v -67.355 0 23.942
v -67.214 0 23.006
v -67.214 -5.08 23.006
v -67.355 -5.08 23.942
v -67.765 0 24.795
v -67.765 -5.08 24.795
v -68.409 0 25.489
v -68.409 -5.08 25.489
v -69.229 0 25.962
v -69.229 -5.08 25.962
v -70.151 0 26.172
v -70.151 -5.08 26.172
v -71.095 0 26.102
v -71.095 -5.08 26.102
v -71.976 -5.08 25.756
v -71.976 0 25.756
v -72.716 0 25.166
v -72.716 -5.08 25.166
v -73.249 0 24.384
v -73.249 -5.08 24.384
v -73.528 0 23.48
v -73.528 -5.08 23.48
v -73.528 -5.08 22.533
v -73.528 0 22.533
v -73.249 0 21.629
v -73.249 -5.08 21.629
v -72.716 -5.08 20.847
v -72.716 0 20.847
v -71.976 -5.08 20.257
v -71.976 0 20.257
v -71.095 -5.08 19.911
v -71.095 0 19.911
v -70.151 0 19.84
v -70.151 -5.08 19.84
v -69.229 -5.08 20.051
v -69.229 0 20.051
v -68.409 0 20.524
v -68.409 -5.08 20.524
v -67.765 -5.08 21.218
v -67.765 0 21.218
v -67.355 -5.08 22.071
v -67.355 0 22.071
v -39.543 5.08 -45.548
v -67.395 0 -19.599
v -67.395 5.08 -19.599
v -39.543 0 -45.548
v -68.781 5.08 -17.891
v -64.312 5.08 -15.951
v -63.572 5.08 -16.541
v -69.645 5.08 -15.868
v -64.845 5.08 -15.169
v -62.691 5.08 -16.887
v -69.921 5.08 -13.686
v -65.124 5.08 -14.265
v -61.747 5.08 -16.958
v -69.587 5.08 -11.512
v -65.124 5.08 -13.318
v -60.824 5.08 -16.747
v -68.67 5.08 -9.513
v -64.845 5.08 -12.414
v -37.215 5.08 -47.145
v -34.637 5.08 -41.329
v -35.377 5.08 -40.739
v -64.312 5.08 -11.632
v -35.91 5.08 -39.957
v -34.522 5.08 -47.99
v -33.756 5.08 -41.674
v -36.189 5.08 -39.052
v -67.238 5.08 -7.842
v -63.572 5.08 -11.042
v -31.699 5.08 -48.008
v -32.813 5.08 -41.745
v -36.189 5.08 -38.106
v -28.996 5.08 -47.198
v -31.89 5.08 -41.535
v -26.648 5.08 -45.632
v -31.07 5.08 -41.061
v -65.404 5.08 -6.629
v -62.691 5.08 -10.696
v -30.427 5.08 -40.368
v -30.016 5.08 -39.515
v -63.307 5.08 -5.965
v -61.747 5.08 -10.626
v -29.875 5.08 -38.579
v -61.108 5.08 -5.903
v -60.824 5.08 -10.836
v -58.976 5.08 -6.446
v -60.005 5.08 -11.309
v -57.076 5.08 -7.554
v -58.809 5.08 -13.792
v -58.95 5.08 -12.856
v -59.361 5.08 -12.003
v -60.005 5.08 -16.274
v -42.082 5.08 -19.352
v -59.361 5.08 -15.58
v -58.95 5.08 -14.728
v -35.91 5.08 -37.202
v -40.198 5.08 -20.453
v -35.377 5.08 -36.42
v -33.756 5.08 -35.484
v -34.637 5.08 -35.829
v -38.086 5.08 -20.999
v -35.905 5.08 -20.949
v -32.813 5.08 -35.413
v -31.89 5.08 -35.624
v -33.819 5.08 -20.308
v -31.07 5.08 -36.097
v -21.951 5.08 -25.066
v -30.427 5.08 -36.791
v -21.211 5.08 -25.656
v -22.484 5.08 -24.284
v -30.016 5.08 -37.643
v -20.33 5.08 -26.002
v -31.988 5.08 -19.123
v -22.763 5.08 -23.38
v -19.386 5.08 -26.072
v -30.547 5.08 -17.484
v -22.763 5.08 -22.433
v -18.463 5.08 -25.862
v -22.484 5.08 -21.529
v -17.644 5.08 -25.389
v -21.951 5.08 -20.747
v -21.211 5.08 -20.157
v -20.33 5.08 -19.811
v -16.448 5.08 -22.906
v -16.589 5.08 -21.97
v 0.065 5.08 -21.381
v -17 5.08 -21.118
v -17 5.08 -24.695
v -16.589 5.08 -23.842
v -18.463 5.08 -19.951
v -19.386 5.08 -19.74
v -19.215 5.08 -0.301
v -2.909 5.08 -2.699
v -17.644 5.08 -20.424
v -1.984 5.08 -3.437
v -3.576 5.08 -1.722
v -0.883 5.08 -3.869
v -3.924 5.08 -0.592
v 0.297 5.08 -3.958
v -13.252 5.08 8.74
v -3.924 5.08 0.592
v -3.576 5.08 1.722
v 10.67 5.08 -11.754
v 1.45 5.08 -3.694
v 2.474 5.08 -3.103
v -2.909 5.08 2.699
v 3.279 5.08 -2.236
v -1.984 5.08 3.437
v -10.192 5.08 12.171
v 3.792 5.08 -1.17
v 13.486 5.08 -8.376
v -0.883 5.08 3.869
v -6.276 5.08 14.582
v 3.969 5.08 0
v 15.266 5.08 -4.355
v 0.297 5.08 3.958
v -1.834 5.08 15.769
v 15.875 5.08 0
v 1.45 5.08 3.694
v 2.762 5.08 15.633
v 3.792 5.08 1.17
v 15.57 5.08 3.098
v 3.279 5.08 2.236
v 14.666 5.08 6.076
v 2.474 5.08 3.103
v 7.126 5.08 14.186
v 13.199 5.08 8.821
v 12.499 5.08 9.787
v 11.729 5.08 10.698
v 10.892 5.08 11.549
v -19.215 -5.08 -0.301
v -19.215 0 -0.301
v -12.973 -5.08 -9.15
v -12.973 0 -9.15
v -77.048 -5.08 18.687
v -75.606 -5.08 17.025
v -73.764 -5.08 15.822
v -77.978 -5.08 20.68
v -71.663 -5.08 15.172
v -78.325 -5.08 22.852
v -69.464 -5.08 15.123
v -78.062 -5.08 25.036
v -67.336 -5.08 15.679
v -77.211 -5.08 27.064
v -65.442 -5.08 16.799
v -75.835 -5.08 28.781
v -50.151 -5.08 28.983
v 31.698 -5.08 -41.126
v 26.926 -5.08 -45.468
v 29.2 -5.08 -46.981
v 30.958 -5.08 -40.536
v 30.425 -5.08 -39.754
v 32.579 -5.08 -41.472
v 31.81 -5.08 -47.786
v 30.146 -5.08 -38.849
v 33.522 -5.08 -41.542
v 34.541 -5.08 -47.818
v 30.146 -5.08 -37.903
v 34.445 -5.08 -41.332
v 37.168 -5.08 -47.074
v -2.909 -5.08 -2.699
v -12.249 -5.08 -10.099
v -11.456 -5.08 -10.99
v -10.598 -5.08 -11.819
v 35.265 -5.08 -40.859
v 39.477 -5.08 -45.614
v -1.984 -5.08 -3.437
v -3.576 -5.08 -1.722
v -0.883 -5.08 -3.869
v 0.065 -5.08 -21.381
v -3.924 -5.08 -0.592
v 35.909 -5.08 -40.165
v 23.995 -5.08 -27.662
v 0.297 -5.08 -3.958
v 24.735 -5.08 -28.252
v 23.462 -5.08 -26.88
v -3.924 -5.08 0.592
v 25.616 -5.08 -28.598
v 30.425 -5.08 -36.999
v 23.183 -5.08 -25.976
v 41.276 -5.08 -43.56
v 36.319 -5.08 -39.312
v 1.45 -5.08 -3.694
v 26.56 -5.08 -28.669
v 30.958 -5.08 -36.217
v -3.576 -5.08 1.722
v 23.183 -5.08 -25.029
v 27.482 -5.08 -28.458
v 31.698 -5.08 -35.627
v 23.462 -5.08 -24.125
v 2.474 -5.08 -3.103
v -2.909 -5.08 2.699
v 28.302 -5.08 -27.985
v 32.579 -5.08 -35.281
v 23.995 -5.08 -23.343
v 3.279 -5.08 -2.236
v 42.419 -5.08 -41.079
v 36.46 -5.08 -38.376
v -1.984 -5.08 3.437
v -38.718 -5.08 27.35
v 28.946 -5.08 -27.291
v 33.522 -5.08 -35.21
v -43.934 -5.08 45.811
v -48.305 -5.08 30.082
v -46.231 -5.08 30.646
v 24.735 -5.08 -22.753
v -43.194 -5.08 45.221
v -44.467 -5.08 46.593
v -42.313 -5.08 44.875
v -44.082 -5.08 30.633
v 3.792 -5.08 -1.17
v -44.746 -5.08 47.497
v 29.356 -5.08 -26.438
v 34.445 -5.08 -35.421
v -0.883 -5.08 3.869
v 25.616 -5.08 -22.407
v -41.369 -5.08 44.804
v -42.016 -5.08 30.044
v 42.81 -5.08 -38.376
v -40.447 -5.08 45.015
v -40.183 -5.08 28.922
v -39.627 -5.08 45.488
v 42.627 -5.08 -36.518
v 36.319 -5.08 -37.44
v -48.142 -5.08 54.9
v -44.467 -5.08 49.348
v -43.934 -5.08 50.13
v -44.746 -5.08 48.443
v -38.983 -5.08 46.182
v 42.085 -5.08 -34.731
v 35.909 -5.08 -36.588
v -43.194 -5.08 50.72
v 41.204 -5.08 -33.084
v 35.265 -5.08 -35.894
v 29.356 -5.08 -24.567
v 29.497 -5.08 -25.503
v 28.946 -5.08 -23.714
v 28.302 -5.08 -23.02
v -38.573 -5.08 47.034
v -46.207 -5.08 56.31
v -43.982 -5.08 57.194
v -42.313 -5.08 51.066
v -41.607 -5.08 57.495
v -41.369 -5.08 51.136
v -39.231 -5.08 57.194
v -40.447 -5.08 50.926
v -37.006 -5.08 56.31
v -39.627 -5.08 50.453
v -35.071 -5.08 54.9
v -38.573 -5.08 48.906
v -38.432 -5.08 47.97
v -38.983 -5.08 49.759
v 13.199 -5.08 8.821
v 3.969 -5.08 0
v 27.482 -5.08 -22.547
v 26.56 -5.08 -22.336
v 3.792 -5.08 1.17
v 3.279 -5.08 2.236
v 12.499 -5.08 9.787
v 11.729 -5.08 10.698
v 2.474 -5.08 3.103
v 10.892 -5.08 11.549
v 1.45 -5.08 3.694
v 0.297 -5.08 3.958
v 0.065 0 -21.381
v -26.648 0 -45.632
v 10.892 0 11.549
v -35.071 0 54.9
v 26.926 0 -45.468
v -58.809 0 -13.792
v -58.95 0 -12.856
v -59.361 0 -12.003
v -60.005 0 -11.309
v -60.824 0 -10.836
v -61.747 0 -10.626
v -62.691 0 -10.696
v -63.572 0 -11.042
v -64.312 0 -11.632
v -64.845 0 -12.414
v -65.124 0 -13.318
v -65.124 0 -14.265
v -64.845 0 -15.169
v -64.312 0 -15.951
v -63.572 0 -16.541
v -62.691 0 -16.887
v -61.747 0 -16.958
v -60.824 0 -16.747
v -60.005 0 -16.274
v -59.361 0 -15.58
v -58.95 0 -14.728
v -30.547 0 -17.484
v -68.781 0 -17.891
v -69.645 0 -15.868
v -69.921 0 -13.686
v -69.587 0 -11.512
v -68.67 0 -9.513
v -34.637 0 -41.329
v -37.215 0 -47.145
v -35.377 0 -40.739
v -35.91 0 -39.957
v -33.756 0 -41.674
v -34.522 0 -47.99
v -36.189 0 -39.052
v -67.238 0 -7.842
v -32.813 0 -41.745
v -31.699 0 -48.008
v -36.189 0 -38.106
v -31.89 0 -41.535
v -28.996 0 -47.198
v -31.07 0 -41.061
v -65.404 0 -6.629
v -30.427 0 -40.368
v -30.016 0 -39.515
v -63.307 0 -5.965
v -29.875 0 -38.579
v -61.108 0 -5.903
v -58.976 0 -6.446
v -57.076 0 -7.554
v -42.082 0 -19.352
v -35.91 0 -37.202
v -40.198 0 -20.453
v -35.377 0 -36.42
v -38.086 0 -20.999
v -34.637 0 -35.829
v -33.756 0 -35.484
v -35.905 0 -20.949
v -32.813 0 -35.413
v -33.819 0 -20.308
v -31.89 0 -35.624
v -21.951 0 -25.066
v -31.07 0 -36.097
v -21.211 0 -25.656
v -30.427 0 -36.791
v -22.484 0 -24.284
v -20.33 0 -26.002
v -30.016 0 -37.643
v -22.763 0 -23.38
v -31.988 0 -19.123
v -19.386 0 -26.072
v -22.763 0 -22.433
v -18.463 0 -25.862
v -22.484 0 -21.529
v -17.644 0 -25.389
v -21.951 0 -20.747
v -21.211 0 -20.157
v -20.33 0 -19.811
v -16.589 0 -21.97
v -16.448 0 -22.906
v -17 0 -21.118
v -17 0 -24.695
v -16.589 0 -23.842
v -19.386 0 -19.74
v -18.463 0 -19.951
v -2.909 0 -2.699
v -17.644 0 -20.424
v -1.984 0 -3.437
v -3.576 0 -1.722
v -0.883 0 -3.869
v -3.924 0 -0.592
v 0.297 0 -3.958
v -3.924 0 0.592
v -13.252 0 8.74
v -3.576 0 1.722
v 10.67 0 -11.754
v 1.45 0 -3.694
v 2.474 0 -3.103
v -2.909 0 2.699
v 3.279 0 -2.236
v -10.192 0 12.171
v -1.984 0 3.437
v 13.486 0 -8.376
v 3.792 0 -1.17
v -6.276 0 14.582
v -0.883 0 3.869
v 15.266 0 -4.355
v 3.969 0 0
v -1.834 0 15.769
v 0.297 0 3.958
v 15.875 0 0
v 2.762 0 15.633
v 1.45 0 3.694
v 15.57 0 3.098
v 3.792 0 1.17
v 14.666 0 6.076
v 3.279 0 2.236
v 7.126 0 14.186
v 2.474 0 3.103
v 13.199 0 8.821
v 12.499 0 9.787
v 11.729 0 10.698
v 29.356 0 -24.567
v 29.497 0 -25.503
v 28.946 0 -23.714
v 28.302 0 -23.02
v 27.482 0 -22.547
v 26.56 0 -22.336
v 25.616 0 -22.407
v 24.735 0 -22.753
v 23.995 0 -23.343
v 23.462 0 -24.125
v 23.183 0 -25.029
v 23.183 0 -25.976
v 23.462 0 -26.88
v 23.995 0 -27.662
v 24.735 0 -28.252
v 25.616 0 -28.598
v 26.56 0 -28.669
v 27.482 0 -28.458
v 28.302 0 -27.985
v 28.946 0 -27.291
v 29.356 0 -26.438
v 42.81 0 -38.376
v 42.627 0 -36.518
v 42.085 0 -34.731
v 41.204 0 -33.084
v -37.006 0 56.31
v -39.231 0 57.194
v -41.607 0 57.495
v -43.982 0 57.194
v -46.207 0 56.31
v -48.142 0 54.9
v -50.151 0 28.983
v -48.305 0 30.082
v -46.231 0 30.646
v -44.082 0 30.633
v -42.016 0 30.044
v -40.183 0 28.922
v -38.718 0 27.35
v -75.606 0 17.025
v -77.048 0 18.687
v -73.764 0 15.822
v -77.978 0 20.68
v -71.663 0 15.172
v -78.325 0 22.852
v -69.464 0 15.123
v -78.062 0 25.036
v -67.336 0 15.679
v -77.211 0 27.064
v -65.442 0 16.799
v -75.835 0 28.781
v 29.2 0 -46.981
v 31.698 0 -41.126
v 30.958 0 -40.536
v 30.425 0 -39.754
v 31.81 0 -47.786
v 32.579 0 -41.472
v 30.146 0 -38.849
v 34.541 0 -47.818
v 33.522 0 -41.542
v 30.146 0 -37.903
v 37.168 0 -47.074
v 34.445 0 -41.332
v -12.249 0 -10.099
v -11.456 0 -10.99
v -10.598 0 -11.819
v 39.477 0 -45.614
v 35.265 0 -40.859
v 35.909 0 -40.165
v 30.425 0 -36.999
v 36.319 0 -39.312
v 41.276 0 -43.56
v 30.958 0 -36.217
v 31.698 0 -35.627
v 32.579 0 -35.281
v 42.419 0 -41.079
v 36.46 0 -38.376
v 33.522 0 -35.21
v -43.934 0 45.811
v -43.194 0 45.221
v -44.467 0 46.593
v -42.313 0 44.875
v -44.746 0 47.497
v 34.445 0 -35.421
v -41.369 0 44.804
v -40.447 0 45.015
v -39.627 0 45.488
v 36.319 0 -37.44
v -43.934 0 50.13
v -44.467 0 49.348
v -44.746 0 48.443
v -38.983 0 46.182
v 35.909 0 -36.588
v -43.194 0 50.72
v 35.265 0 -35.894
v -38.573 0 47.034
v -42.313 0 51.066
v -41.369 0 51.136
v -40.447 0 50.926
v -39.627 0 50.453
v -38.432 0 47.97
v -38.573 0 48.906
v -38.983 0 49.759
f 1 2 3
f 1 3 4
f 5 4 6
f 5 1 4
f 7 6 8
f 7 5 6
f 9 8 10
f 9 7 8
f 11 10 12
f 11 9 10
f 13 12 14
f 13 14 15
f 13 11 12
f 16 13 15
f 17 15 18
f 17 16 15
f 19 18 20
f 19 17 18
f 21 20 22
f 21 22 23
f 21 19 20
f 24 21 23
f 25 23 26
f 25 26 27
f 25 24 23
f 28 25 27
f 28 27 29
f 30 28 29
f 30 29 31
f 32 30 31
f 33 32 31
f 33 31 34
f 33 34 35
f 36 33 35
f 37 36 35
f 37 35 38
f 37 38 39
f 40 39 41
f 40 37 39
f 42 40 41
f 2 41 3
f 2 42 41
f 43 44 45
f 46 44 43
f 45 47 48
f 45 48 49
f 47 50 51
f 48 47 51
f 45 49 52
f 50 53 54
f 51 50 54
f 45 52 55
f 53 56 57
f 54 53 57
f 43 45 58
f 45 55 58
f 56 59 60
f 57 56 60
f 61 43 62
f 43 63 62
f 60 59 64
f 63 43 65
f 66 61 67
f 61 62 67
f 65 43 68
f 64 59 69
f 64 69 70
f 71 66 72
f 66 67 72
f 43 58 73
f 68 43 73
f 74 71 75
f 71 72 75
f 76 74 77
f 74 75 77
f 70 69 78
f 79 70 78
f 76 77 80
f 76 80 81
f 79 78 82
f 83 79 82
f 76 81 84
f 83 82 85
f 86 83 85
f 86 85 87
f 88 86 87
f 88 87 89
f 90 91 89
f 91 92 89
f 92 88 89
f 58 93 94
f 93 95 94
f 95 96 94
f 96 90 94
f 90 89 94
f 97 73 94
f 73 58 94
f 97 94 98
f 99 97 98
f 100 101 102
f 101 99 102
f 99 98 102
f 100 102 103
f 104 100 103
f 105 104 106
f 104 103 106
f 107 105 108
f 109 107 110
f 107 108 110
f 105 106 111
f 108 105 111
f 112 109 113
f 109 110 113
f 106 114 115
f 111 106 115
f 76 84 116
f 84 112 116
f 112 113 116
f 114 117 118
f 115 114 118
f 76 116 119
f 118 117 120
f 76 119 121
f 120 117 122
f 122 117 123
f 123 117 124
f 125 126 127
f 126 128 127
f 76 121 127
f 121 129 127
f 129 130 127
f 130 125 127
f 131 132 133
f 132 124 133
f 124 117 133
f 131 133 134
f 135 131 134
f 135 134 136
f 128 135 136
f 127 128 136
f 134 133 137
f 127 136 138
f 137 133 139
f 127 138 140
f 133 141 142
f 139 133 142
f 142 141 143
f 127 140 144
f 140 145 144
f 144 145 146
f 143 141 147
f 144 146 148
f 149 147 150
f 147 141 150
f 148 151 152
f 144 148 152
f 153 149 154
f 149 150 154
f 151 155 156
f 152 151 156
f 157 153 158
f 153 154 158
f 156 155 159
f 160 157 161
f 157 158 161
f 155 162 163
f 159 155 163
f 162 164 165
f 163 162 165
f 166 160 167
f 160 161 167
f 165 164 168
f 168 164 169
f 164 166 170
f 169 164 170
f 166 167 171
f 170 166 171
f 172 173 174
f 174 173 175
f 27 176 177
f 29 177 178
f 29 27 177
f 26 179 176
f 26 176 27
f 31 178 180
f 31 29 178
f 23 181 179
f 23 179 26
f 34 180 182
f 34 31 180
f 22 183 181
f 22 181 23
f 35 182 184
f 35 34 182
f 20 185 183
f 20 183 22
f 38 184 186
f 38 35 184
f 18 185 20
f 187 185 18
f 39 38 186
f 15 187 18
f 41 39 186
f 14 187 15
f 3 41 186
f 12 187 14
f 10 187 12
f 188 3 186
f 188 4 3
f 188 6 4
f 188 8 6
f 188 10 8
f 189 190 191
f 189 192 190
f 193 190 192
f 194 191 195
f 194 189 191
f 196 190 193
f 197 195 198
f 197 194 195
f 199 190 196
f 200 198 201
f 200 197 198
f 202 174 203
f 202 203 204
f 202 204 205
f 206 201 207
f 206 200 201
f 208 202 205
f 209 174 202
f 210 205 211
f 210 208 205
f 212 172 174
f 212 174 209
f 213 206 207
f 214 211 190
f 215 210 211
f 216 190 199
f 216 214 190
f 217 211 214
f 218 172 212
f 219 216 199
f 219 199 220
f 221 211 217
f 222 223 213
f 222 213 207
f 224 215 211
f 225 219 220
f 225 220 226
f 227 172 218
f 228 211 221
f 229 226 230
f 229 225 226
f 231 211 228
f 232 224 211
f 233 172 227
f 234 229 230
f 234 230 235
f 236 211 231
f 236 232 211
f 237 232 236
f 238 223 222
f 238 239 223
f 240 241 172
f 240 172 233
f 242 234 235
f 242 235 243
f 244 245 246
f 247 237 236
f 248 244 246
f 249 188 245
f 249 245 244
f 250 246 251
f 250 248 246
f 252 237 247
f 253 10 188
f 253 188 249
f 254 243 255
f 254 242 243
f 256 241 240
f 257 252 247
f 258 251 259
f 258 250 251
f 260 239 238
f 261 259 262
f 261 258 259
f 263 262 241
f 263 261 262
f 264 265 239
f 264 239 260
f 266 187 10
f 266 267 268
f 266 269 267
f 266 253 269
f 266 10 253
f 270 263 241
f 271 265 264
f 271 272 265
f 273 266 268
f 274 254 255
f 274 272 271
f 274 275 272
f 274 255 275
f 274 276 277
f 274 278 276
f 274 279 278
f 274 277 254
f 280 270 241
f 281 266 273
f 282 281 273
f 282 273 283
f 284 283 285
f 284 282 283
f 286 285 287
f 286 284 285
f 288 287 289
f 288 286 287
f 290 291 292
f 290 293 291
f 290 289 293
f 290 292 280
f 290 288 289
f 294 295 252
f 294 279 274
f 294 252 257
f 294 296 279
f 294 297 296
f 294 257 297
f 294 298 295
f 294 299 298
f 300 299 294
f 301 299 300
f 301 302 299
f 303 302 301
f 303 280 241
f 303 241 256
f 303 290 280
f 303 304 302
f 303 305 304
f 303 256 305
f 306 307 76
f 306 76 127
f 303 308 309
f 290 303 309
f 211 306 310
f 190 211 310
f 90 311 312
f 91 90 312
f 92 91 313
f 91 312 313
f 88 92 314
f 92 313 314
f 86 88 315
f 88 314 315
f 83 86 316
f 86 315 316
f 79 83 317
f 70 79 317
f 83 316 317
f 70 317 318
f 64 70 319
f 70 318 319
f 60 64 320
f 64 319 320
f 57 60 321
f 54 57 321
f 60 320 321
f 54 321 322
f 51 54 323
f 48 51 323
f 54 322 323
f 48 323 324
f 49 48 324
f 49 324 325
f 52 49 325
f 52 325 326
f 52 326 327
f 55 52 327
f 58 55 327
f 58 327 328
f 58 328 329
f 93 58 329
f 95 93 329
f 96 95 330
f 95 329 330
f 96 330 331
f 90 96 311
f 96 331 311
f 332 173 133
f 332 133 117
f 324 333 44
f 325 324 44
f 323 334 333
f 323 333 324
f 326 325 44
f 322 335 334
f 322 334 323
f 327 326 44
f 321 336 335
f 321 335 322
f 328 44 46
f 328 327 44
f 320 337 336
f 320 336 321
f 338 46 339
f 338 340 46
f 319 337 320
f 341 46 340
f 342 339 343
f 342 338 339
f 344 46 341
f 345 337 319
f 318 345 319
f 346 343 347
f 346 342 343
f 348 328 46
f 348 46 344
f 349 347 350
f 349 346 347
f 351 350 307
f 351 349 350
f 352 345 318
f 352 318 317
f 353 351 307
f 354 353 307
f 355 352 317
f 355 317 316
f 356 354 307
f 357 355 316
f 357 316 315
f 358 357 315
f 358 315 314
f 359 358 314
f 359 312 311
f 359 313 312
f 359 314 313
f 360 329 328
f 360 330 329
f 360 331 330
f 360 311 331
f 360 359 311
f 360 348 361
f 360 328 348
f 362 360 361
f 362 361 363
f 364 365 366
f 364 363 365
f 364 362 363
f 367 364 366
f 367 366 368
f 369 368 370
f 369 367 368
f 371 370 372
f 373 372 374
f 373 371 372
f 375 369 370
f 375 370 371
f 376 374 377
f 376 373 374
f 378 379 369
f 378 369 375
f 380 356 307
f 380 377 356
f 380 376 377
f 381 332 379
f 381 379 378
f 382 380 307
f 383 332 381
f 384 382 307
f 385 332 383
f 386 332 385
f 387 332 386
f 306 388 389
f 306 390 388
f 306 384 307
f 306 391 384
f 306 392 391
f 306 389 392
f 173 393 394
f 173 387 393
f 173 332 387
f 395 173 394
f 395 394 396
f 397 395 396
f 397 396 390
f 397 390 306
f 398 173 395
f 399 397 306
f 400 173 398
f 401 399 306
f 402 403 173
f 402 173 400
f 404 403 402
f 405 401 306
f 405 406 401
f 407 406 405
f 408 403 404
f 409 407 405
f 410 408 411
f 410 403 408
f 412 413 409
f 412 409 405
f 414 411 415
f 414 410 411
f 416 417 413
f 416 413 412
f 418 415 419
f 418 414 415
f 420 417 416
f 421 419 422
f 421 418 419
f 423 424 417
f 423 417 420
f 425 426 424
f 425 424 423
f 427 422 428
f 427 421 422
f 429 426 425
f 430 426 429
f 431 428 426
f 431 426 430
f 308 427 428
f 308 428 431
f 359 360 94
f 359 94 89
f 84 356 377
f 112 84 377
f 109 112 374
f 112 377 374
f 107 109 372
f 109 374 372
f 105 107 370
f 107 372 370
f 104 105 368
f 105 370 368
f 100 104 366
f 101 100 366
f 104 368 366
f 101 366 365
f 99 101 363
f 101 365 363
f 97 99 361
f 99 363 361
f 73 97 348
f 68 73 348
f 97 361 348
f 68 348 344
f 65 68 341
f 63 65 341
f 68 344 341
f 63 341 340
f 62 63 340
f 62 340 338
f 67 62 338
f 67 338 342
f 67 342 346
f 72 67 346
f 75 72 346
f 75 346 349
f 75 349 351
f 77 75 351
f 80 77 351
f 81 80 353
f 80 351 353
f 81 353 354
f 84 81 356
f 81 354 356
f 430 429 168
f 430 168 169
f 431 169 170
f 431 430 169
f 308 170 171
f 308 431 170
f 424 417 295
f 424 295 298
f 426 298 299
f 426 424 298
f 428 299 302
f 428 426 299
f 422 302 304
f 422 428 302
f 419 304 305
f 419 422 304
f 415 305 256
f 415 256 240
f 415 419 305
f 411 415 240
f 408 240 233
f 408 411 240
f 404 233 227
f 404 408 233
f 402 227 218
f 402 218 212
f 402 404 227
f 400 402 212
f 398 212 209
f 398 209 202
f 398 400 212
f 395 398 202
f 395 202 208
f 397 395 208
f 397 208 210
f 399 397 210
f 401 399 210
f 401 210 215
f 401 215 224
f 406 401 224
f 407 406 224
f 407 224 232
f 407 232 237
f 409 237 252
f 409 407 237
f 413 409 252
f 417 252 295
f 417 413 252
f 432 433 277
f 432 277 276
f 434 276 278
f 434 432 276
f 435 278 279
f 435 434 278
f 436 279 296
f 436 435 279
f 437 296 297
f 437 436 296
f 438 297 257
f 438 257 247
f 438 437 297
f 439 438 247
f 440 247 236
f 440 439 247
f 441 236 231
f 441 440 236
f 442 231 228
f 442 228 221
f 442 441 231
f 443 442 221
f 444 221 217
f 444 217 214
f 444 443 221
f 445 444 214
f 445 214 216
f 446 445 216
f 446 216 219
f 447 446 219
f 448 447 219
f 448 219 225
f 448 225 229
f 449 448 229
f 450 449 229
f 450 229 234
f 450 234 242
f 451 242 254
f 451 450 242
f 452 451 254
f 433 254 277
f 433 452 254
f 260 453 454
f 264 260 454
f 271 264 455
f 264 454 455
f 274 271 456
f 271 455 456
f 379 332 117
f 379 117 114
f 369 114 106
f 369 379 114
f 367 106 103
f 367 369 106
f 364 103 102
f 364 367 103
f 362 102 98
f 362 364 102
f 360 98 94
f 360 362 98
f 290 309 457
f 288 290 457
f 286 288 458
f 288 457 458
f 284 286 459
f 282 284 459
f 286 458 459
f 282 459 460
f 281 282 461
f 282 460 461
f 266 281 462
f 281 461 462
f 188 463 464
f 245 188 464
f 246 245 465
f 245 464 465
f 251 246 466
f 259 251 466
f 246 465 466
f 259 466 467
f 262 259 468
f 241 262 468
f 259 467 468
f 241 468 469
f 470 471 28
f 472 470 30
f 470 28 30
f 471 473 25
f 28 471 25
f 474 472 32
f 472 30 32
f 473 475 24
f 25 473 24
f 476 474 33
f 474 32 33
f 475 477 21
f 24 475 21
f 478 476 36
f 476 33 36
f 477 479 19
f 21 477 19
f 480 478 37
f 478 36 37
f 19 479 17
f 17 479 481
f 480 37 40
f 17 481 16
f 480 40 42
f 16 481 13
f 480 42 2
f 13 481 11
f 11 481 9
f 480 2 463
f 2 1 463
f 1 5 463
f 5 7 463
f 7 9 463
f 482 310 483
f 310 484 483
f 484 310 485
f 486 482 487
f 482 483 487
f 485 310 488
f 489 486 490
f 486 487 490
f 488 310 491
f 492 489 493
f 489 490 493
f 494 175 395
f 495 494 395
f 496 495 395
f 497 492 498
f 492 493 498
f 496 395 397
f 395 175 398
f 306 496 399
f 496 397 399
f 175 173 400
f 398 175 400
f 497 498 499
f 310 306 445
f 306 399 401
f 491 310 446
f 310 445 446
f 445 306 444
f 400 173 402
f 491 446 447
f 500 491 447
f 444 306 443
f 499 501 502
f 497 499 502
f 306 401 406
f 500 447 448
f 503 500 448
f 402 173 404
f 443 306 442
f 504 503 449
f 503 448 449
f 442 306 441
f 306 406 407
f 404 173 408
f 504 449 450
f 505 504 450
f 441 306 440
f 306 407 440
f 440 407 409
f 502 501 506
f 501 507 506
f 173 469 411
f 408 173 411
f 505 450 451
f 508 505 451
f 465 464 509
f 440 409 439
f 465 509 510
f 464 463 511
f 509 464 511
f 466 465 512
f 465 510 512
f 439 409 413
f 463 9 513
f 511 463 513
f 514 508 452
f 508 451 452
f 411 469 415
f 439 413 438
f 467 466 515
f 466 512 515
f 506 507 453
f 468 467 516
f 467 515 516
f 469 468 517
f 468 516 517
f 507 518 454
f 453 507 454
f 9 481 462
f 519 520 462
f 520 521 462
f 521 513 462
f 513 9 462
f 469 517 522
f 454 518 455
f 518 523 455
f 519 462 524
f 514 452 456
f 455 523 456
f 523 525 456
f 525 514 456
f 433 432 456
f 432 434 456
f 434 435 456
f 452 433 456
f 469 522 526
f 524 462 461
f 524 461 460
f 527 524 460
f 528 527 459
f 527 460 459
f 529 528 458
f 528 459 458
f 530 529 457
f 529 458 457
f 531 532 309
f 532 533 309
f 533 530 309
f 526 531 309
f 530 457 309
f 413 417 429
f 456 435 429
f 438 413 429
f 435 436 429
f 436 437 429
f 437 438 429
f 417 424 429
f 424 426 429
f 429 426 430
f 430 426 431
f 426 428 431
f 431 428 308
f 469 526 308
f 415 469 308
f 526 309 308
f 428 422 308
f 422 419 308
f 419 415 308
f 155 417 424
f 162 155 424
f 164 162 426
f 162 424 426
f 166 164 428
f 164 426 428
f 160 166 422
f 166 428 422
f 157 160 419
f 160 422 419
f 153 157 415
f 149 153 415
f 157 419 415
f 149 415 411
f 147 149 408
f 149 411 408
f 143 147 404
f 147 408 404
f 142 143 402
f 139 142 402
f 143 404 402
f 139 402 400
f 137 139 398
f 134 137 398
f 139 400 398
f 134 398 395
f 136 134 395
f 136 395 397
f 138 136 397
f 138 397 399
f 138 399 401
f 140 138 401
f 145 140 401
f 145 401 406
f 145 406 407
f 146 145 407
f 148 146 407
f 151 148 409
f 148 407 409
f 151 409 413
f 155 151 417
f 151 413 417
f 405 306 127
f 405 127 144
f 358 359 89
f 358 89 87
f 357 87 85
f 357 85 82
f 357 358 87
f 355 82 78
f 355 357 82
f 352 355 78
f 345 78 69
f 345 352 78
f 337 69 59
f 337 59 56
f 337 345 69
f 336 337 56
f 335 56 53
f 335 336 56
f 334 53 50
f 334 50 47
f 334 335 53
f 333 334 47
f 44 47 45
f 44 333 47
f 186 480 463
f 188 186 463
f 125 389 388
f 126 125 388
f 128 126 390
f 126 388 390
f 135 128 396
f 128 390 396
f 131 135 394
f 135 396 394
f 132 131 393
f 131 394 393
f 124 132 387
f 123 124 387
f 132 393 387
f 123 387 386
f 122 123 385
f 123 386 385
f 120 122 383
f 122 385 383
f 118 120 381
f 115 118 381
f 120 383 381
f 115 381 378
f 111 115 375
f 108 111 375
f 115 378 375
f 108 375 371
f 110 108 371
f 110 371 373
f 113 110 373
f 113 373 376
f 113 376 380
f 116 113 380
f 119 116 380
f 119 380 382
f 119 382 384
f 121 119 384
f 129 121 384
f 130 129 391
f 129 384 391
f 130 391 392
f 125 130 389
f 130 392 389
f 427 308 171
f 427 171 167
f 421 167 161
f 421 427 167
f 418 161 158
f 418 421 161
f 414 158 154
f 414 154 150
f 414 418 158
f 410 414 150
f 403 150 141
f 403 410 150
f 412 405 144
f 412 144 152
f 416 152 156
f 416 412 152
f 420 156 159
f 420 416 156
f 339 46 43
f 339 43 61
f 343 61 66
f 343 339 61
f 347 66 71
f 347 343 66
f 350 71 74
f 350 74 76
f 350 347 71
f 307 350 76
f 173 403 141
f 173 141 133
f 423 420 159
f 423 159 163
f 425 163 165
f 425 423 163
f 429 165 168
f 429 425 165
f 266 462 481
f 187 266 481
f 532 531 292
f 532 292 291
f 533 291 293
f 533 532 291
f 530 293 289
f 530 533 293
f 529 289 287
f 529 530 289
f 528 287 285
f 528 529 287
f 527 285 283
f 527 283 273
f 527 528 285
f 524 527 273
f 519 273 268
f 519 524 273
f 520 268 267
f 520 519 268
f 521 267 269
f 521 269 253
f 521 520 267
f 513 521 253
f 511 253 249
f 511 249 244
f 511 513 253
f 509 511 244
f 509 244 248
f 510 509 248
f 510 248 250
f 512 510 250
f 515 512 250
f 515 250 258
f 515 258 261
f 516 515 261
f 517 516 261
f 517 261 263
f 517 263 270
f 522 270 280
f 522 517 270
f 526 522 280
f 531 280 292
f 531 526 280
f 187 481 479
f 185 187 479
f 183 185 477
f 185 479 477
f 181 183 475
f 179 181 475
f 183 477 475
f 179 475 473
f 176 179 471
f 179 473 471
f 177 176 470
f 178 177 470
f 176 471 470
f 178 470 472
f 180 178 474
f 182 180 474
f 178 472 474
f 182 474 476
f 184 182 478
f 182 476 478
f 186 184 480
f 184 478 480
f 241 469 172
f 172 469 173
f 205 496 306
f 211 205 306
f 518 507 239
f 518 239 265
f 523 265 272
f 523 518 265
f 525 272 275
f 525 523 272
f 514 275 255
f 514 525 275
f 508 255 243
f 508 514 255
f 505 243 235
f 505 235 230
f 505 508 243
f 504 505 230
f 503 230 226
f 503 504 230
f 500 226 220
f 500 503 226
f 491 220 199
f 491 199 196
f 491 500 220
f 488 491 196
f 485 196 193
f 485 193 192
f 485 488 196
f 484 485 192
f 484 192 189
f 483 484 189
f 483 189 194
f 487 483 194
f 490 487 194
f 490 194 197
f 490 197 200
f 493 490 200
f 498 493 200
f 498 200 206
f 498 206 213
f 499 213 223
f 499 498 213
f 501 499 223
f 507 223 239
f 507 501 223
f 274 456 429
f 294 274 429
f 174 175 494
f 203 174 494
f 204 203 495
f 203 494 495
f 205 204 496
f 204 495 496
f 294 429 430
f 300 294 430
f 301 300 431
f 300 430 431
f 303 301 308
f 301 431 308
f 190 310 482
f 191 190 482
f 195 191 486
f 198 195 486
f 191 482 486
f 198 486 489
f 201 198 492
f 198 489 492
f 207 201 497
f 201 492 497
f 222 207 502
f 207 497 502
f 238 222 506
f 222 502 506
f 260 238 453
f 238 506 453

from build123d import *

# Parameters (mm, degrees)
F0_R     = 3.175
F0_R_2   = 3.96875
F2_DEPTH = 5.08
F3_DEPTH = 5.08


with BuildPart() as f2:
    # F0 (on Front) → F2 (new body)
    with BuildSketch(Plane.XZ):
        with BuildLine():
            ThreePointArc((-62.4511918078, 23.0063483758), (-67.2442419203, 30.2944442282), (-75.8348368232, 28.7807237291))
            ThreePointArc((-75.8348368232, 28.7807237291), (-76.3849752141, 17.8055319436), (-65.4422370763, 16.798571653))
            ThreePointArc((-65.4422370763, 16.798571653), (-63.237943921, 19.5609585706), (-62.4511918078, 23.0063483758))
        make_face()
        with Locations((-70.3886918078, 23.0063483758)):
            Circle(F0_R, mode=Mode.SUBTRACT)
        with BuildLine():
            ThreePointArc((-13.2524193062, 8.7400805221), (-1.834314477, 15.7686687897), (10.8922900307, 11.5487507067))
            Line((10.8922900307, 11.5487507067), (-35.0711574392, 54.8995176744))
            ThreePointArc((-35.0711574392, 54.8995176744), (-32.8608164346, 51.7436071154), (-32.0815314576, 47.9702672503))
            ThreePointArc((-32.0815314576, 47.9702672503), (-45.3798713227, 39.2245522274), (-48.1419054761, 54.8995176744))
            Line((-48.1419054761, 54.8995176744), (-75.8348368232, 28.7807237291))
            ThreePointArc((-75.8348368232, 28.7807237291), (-67.2442419203, 30.2944442282), (-62.4511918078, 23.0063483758))
            ThreePointArc((-62.4511918078, 23.0063483758), (-63.237943921, 19.5609585706), (-65.4422370763, 16.798571653))
            Line((-65.4422370763, 16.798571653), (-50.1509863937, 28.9828821829))
            ThreePointArc((-50.1509863937, 28.9828821829), (-44.0823996147, 30.6328866939), (-38.7182233604, 27.3502241323))
            Line((-38.7182233604, 27.3502241323), (-19.2147683858, -0.3005169703))
            Line((-19.2147683858, -0.3005169703), (-13.2524193062, 8.7400805221))
        make_face()
        with BuildLine():
            ThreePointArc((-32.0815314576, 47.9702672503), (-32.8608164346, 51.7436071154), (-35.0711574392, 54.8995176744))
            ThreePointArc((-35.0711574392, 54.8995176744), (-41.6065314576, 57.4952672503), (-48.1419054761, 54.8995176744))
            ThreePointArc((-48.1419054761, 54.8995176744), (-45.3798713227, 39.2245522274), (-32.0815314576, 47.9702672503))
        make_face()
        with Locations((-41.6065314576, 47.9702672503)):
            Circle(F0_R, mode=Mode.SUBTRACT)
        with BuildLine():
            ThreePointArc((15.875, 0), (15.1912005478, 4.609018433), (13.1987101208, 8.820979319))
            ThreePointArc((13.1987101208, 8.820979319), (12.1224690662, 10.2499448164), (10.8922900307, 11.5487507067))
            ThreePointArc((10.8922900307, 11.5487507067), (-1.834314477, 15.7686687897), (-13.2524193062, 8.7400805221))
            ThreePointArc((-13.2524193062, 8.7400805221), (-15.8730587934, -0.2482529814), (-12.9726166036, -9.1502373442))
            ThreePointArc((-12.9726166036, -9.1502373442), (-11.8607666217, -10.5516747555), (-10.5983019047, -11.8191210221))
            ThreePointArc((-10.5983019047, -11.8191210221), (0.0485522706, -15.8749257534), (10.6703987497, -11.7540722953))
            ThreePointArc((10.6703987497, -11.7540722953), (14.5156502636, -6.4274040191), (15.875, 0))
        make_face()
        Circle(F0_R_2, mode=Mode.SUBTRACT)
        with BuildLine():
            ThreePointArc((-12.9726166036, -9.1502373442), (-15.8730587934, -0.2482529814), (-13.2524193062, 8.7400805221))
            Line((-13.2524193062, 8.7400805221), (-19.2147683858, -0.3005169703))
            Line((-19.2147683858, -0.3005169703), (-12.9726166036, -9.1502373442))
        make_face()
        with BuildLine():
            Line((-10.5983019047, -11.8191210221), (0.0653932355, -21.3813431455))
            Line((0.0653932355, -21.3813431455), (10.6703987497, -11.7540722953))
            ThreePointArc((10.6703987497, -11.7540722953), (0.0485522706, -15.8749257534), (-10.5983019047, -11.8191210221))
        make_face()
        with BuildLine():
            ThreePointArc((26.9262440233, -45.4676864135), (27.0442454474, -31.1806737127), (41.2044512386, -33.0836262089))
            Line((41.2044512386, -33.0836262089), (13.1987101208, 8.820979319))
            ThreePointArc((13.1987101208, 8.820979319), (15.1912005478, 4.609018433), (15.875, 0))
            ThreePointArc((15.875, 0), (14.5156502636, -6.4274040191), (10.6703987497, -11.7540722953))
            Line((10.6703987497, -11.7540722953), (0.0653932355, -21.3813431455))
            Line((0.0653932355, -21.3813431455), (26.9262440233, -45.4676864135))
        make_face()
        with Locations((26.3222689506, -25.5025770961)):
            Circle(F0_R, mode=Mode.SUBTRACT)
        with BuildLine():
            ThreePointArc((26.9262440233, -45.4676864135), (37.1682864336, -47.0737686401), (42.8102251661, -38.3762138003))
            ThreePointArc((42.8102251661, -38.3762138003), (42.3999454948, -35.6108027404), (41.2044512386, -33.0836262089))
            ThreePointArc((41.2044512386, -33.0836262089), (27.0442454474, -31.1806737127), (26.9262440233, -45.4676864135))
        make_face()
        with Locations((33.2852251661, -38.3762138003)):
            Circle(F0_R, mode=Mode.SUBTRACT)
    extrude(amount=F2_DEPTH)


with BuildPart() as f3:
    # F0 (on Front) → F3 (new body)
    with BuildSketch(Plane.XZ):
        with BuildLine():
            Line((-10.5983019047, -11.8191210221), (0.0653932355, -21.3813431455))
            Line((0.0653932355, -21.3813431455), (10.6703987497, -11.7540722953))
            ThreePointArc((10.6703987497, -11.7540722953), (0.0485522706, -15.8749257534), (-10.5983019047, -11.8191210221))
        make_face()
        with BuildLine():
            ThreePointArc((-12.9726166036, -9.1502373442), (-15.8730587934, -0.2482529814), (-13.2524193062, 8.7400805221))
            Line((-13.2524193062, 8.7400805221), (-19.2147683858, -0.3005169703))
            Line((-19.2147683858, -0.3005169703), (-12.9726166036, -9.1502373442))
        make_face()
        with BuildLine():
            ThreePointArc((15.875, 0), (15.1912005478, 4.609018433), (13.1987101208, 8.820979319))
            ThreePointArc((13.1987101208, 8.820979319), (12.1224690662, 10.2499448164), (10.8922900307, 11.5487507067))
            ThreePointArc((10.8922900307, 11.5487507067), (-1.834314477, 15.7686687897), (-13.2524193062, 8.7400805221))
            ThreePointArc((-13.2524193062, 8.7400805221), (-15.8730587934, -0.2482529814), (-12.9726166036, -9.1502373442))
            ThreePointArc((-12.9726166036, -9.1502373442), (-11.8607666217, -10.5516747555), (-10.5983019047, -11.8191210221))
            ThreePointArc((-10.5983019047, -11.8191210221), (0.0485522706, -15.8749257534), (10.6703987497, -11.7540722953))
            ThreePointArc((10.6703987497, -11.7540722953), (14.5156502636, -6.4274040191), (15.875, 0))
        make_face()
        Circle(F0_R_2, mode=Mode.SUBTRACT)
        with BuildLine():
            Line((-26.647623873, -45.6315380732), (0.0653932355, -21.3813431455))
            Line((0.0653932355, -21.3813431455), (-10.5983019047, -11.8191210221))
            ThreePointArc((-10.5983019047, -11.8191210221), (-11.8607666217, -10.5516747555), (-12.9726166036, -9.1502373442))
            Line((-12.9726166036, -9.1502373442), (-19.2147683858, -0.3005169703))
            Line((-19.2147683858, -0.3005169703), (-30.5474012326, -17.4839744853))
            ThreePointArc((-30.5474012326, -17.4839744853), (-35.9047663103, -20.9493627188), (-42.0820013957, -19.3518512525))
            Line((-42.0820013957, -19.3518512525), (-57.0757936348, -7.5537803256))
            ThreePointArc((-57.0757936348, -7.5537803256), (-54.8440071189, -10.3244537385), (-54.0466841448, -13.7916973539))
            ThreePointArc((-54.0466841448, -13.7916973539), (-58.817458973, -21.070142101), (-67.394906617, -19.5992776228))
            Line((-67.394906617, -19.5992776228), (-39.5427300894, -45.5481910186))
            ThreePointArc((-39.5427300894, -45.5481910186), (-36.849933329, -29.8449609995), (-23.5248631228, -38.579094696))
            ThreePointArc((-23.5248631228, -38.579094696), (-24.3404729646, -42.4355371074), (-26.647623873, -45.6315380732))
        make_face()
        with Locations((-19.6233562292, -22.9063374758)):
            Circle(F0_R, mode=Mode.SUBTRACT)
        with BuildLine():
            ThreePointArc((-39.5427300894, -45.5481910186), (-33.1114263313, -48.1038957423), (-26.647623873, -45.6315380732))
            ThreePointArc((-26.647623873, -45.6315380732), (-24.3404729646, -42.4355371074), (-23.5248631228, -38.579094696))
            ThreePointArc((-23.5248631228, -38.579094696), (-36.849933329, -29.8449609995), (-39.5427300894, -45.5481910186))
        make_face()
        with Locations((-33.0498631228, -38.579094696)):
            Circle(F0_R, mode=Mode.SUBTRACT)
        with BuildLine():
            ThreePointArc((-57.0757936348, -7.5537803256), (-68.0121676911, -8.627656241), (-67.394906617, -19.5992776228))
            ThreePointArc((-67.394906617, -19.5992776228), (-58.817458973, -21.070142101), (-54.0466841448, -13.7916973539))
            ThreePointArc((-54.0466841448, -13.7916973539), (-54.8440071189, -10.3244537385), (-57.0757936348, -7.5537803256))
        make_face()
        with Locations((-61.9841841448, -13.7916973539)):
            Circle(F0_R, mode=Mode.SUBTRACT)
    extrude(amount=-F3_DEPTH)


solid = Compound([f2.part, f3.part])
